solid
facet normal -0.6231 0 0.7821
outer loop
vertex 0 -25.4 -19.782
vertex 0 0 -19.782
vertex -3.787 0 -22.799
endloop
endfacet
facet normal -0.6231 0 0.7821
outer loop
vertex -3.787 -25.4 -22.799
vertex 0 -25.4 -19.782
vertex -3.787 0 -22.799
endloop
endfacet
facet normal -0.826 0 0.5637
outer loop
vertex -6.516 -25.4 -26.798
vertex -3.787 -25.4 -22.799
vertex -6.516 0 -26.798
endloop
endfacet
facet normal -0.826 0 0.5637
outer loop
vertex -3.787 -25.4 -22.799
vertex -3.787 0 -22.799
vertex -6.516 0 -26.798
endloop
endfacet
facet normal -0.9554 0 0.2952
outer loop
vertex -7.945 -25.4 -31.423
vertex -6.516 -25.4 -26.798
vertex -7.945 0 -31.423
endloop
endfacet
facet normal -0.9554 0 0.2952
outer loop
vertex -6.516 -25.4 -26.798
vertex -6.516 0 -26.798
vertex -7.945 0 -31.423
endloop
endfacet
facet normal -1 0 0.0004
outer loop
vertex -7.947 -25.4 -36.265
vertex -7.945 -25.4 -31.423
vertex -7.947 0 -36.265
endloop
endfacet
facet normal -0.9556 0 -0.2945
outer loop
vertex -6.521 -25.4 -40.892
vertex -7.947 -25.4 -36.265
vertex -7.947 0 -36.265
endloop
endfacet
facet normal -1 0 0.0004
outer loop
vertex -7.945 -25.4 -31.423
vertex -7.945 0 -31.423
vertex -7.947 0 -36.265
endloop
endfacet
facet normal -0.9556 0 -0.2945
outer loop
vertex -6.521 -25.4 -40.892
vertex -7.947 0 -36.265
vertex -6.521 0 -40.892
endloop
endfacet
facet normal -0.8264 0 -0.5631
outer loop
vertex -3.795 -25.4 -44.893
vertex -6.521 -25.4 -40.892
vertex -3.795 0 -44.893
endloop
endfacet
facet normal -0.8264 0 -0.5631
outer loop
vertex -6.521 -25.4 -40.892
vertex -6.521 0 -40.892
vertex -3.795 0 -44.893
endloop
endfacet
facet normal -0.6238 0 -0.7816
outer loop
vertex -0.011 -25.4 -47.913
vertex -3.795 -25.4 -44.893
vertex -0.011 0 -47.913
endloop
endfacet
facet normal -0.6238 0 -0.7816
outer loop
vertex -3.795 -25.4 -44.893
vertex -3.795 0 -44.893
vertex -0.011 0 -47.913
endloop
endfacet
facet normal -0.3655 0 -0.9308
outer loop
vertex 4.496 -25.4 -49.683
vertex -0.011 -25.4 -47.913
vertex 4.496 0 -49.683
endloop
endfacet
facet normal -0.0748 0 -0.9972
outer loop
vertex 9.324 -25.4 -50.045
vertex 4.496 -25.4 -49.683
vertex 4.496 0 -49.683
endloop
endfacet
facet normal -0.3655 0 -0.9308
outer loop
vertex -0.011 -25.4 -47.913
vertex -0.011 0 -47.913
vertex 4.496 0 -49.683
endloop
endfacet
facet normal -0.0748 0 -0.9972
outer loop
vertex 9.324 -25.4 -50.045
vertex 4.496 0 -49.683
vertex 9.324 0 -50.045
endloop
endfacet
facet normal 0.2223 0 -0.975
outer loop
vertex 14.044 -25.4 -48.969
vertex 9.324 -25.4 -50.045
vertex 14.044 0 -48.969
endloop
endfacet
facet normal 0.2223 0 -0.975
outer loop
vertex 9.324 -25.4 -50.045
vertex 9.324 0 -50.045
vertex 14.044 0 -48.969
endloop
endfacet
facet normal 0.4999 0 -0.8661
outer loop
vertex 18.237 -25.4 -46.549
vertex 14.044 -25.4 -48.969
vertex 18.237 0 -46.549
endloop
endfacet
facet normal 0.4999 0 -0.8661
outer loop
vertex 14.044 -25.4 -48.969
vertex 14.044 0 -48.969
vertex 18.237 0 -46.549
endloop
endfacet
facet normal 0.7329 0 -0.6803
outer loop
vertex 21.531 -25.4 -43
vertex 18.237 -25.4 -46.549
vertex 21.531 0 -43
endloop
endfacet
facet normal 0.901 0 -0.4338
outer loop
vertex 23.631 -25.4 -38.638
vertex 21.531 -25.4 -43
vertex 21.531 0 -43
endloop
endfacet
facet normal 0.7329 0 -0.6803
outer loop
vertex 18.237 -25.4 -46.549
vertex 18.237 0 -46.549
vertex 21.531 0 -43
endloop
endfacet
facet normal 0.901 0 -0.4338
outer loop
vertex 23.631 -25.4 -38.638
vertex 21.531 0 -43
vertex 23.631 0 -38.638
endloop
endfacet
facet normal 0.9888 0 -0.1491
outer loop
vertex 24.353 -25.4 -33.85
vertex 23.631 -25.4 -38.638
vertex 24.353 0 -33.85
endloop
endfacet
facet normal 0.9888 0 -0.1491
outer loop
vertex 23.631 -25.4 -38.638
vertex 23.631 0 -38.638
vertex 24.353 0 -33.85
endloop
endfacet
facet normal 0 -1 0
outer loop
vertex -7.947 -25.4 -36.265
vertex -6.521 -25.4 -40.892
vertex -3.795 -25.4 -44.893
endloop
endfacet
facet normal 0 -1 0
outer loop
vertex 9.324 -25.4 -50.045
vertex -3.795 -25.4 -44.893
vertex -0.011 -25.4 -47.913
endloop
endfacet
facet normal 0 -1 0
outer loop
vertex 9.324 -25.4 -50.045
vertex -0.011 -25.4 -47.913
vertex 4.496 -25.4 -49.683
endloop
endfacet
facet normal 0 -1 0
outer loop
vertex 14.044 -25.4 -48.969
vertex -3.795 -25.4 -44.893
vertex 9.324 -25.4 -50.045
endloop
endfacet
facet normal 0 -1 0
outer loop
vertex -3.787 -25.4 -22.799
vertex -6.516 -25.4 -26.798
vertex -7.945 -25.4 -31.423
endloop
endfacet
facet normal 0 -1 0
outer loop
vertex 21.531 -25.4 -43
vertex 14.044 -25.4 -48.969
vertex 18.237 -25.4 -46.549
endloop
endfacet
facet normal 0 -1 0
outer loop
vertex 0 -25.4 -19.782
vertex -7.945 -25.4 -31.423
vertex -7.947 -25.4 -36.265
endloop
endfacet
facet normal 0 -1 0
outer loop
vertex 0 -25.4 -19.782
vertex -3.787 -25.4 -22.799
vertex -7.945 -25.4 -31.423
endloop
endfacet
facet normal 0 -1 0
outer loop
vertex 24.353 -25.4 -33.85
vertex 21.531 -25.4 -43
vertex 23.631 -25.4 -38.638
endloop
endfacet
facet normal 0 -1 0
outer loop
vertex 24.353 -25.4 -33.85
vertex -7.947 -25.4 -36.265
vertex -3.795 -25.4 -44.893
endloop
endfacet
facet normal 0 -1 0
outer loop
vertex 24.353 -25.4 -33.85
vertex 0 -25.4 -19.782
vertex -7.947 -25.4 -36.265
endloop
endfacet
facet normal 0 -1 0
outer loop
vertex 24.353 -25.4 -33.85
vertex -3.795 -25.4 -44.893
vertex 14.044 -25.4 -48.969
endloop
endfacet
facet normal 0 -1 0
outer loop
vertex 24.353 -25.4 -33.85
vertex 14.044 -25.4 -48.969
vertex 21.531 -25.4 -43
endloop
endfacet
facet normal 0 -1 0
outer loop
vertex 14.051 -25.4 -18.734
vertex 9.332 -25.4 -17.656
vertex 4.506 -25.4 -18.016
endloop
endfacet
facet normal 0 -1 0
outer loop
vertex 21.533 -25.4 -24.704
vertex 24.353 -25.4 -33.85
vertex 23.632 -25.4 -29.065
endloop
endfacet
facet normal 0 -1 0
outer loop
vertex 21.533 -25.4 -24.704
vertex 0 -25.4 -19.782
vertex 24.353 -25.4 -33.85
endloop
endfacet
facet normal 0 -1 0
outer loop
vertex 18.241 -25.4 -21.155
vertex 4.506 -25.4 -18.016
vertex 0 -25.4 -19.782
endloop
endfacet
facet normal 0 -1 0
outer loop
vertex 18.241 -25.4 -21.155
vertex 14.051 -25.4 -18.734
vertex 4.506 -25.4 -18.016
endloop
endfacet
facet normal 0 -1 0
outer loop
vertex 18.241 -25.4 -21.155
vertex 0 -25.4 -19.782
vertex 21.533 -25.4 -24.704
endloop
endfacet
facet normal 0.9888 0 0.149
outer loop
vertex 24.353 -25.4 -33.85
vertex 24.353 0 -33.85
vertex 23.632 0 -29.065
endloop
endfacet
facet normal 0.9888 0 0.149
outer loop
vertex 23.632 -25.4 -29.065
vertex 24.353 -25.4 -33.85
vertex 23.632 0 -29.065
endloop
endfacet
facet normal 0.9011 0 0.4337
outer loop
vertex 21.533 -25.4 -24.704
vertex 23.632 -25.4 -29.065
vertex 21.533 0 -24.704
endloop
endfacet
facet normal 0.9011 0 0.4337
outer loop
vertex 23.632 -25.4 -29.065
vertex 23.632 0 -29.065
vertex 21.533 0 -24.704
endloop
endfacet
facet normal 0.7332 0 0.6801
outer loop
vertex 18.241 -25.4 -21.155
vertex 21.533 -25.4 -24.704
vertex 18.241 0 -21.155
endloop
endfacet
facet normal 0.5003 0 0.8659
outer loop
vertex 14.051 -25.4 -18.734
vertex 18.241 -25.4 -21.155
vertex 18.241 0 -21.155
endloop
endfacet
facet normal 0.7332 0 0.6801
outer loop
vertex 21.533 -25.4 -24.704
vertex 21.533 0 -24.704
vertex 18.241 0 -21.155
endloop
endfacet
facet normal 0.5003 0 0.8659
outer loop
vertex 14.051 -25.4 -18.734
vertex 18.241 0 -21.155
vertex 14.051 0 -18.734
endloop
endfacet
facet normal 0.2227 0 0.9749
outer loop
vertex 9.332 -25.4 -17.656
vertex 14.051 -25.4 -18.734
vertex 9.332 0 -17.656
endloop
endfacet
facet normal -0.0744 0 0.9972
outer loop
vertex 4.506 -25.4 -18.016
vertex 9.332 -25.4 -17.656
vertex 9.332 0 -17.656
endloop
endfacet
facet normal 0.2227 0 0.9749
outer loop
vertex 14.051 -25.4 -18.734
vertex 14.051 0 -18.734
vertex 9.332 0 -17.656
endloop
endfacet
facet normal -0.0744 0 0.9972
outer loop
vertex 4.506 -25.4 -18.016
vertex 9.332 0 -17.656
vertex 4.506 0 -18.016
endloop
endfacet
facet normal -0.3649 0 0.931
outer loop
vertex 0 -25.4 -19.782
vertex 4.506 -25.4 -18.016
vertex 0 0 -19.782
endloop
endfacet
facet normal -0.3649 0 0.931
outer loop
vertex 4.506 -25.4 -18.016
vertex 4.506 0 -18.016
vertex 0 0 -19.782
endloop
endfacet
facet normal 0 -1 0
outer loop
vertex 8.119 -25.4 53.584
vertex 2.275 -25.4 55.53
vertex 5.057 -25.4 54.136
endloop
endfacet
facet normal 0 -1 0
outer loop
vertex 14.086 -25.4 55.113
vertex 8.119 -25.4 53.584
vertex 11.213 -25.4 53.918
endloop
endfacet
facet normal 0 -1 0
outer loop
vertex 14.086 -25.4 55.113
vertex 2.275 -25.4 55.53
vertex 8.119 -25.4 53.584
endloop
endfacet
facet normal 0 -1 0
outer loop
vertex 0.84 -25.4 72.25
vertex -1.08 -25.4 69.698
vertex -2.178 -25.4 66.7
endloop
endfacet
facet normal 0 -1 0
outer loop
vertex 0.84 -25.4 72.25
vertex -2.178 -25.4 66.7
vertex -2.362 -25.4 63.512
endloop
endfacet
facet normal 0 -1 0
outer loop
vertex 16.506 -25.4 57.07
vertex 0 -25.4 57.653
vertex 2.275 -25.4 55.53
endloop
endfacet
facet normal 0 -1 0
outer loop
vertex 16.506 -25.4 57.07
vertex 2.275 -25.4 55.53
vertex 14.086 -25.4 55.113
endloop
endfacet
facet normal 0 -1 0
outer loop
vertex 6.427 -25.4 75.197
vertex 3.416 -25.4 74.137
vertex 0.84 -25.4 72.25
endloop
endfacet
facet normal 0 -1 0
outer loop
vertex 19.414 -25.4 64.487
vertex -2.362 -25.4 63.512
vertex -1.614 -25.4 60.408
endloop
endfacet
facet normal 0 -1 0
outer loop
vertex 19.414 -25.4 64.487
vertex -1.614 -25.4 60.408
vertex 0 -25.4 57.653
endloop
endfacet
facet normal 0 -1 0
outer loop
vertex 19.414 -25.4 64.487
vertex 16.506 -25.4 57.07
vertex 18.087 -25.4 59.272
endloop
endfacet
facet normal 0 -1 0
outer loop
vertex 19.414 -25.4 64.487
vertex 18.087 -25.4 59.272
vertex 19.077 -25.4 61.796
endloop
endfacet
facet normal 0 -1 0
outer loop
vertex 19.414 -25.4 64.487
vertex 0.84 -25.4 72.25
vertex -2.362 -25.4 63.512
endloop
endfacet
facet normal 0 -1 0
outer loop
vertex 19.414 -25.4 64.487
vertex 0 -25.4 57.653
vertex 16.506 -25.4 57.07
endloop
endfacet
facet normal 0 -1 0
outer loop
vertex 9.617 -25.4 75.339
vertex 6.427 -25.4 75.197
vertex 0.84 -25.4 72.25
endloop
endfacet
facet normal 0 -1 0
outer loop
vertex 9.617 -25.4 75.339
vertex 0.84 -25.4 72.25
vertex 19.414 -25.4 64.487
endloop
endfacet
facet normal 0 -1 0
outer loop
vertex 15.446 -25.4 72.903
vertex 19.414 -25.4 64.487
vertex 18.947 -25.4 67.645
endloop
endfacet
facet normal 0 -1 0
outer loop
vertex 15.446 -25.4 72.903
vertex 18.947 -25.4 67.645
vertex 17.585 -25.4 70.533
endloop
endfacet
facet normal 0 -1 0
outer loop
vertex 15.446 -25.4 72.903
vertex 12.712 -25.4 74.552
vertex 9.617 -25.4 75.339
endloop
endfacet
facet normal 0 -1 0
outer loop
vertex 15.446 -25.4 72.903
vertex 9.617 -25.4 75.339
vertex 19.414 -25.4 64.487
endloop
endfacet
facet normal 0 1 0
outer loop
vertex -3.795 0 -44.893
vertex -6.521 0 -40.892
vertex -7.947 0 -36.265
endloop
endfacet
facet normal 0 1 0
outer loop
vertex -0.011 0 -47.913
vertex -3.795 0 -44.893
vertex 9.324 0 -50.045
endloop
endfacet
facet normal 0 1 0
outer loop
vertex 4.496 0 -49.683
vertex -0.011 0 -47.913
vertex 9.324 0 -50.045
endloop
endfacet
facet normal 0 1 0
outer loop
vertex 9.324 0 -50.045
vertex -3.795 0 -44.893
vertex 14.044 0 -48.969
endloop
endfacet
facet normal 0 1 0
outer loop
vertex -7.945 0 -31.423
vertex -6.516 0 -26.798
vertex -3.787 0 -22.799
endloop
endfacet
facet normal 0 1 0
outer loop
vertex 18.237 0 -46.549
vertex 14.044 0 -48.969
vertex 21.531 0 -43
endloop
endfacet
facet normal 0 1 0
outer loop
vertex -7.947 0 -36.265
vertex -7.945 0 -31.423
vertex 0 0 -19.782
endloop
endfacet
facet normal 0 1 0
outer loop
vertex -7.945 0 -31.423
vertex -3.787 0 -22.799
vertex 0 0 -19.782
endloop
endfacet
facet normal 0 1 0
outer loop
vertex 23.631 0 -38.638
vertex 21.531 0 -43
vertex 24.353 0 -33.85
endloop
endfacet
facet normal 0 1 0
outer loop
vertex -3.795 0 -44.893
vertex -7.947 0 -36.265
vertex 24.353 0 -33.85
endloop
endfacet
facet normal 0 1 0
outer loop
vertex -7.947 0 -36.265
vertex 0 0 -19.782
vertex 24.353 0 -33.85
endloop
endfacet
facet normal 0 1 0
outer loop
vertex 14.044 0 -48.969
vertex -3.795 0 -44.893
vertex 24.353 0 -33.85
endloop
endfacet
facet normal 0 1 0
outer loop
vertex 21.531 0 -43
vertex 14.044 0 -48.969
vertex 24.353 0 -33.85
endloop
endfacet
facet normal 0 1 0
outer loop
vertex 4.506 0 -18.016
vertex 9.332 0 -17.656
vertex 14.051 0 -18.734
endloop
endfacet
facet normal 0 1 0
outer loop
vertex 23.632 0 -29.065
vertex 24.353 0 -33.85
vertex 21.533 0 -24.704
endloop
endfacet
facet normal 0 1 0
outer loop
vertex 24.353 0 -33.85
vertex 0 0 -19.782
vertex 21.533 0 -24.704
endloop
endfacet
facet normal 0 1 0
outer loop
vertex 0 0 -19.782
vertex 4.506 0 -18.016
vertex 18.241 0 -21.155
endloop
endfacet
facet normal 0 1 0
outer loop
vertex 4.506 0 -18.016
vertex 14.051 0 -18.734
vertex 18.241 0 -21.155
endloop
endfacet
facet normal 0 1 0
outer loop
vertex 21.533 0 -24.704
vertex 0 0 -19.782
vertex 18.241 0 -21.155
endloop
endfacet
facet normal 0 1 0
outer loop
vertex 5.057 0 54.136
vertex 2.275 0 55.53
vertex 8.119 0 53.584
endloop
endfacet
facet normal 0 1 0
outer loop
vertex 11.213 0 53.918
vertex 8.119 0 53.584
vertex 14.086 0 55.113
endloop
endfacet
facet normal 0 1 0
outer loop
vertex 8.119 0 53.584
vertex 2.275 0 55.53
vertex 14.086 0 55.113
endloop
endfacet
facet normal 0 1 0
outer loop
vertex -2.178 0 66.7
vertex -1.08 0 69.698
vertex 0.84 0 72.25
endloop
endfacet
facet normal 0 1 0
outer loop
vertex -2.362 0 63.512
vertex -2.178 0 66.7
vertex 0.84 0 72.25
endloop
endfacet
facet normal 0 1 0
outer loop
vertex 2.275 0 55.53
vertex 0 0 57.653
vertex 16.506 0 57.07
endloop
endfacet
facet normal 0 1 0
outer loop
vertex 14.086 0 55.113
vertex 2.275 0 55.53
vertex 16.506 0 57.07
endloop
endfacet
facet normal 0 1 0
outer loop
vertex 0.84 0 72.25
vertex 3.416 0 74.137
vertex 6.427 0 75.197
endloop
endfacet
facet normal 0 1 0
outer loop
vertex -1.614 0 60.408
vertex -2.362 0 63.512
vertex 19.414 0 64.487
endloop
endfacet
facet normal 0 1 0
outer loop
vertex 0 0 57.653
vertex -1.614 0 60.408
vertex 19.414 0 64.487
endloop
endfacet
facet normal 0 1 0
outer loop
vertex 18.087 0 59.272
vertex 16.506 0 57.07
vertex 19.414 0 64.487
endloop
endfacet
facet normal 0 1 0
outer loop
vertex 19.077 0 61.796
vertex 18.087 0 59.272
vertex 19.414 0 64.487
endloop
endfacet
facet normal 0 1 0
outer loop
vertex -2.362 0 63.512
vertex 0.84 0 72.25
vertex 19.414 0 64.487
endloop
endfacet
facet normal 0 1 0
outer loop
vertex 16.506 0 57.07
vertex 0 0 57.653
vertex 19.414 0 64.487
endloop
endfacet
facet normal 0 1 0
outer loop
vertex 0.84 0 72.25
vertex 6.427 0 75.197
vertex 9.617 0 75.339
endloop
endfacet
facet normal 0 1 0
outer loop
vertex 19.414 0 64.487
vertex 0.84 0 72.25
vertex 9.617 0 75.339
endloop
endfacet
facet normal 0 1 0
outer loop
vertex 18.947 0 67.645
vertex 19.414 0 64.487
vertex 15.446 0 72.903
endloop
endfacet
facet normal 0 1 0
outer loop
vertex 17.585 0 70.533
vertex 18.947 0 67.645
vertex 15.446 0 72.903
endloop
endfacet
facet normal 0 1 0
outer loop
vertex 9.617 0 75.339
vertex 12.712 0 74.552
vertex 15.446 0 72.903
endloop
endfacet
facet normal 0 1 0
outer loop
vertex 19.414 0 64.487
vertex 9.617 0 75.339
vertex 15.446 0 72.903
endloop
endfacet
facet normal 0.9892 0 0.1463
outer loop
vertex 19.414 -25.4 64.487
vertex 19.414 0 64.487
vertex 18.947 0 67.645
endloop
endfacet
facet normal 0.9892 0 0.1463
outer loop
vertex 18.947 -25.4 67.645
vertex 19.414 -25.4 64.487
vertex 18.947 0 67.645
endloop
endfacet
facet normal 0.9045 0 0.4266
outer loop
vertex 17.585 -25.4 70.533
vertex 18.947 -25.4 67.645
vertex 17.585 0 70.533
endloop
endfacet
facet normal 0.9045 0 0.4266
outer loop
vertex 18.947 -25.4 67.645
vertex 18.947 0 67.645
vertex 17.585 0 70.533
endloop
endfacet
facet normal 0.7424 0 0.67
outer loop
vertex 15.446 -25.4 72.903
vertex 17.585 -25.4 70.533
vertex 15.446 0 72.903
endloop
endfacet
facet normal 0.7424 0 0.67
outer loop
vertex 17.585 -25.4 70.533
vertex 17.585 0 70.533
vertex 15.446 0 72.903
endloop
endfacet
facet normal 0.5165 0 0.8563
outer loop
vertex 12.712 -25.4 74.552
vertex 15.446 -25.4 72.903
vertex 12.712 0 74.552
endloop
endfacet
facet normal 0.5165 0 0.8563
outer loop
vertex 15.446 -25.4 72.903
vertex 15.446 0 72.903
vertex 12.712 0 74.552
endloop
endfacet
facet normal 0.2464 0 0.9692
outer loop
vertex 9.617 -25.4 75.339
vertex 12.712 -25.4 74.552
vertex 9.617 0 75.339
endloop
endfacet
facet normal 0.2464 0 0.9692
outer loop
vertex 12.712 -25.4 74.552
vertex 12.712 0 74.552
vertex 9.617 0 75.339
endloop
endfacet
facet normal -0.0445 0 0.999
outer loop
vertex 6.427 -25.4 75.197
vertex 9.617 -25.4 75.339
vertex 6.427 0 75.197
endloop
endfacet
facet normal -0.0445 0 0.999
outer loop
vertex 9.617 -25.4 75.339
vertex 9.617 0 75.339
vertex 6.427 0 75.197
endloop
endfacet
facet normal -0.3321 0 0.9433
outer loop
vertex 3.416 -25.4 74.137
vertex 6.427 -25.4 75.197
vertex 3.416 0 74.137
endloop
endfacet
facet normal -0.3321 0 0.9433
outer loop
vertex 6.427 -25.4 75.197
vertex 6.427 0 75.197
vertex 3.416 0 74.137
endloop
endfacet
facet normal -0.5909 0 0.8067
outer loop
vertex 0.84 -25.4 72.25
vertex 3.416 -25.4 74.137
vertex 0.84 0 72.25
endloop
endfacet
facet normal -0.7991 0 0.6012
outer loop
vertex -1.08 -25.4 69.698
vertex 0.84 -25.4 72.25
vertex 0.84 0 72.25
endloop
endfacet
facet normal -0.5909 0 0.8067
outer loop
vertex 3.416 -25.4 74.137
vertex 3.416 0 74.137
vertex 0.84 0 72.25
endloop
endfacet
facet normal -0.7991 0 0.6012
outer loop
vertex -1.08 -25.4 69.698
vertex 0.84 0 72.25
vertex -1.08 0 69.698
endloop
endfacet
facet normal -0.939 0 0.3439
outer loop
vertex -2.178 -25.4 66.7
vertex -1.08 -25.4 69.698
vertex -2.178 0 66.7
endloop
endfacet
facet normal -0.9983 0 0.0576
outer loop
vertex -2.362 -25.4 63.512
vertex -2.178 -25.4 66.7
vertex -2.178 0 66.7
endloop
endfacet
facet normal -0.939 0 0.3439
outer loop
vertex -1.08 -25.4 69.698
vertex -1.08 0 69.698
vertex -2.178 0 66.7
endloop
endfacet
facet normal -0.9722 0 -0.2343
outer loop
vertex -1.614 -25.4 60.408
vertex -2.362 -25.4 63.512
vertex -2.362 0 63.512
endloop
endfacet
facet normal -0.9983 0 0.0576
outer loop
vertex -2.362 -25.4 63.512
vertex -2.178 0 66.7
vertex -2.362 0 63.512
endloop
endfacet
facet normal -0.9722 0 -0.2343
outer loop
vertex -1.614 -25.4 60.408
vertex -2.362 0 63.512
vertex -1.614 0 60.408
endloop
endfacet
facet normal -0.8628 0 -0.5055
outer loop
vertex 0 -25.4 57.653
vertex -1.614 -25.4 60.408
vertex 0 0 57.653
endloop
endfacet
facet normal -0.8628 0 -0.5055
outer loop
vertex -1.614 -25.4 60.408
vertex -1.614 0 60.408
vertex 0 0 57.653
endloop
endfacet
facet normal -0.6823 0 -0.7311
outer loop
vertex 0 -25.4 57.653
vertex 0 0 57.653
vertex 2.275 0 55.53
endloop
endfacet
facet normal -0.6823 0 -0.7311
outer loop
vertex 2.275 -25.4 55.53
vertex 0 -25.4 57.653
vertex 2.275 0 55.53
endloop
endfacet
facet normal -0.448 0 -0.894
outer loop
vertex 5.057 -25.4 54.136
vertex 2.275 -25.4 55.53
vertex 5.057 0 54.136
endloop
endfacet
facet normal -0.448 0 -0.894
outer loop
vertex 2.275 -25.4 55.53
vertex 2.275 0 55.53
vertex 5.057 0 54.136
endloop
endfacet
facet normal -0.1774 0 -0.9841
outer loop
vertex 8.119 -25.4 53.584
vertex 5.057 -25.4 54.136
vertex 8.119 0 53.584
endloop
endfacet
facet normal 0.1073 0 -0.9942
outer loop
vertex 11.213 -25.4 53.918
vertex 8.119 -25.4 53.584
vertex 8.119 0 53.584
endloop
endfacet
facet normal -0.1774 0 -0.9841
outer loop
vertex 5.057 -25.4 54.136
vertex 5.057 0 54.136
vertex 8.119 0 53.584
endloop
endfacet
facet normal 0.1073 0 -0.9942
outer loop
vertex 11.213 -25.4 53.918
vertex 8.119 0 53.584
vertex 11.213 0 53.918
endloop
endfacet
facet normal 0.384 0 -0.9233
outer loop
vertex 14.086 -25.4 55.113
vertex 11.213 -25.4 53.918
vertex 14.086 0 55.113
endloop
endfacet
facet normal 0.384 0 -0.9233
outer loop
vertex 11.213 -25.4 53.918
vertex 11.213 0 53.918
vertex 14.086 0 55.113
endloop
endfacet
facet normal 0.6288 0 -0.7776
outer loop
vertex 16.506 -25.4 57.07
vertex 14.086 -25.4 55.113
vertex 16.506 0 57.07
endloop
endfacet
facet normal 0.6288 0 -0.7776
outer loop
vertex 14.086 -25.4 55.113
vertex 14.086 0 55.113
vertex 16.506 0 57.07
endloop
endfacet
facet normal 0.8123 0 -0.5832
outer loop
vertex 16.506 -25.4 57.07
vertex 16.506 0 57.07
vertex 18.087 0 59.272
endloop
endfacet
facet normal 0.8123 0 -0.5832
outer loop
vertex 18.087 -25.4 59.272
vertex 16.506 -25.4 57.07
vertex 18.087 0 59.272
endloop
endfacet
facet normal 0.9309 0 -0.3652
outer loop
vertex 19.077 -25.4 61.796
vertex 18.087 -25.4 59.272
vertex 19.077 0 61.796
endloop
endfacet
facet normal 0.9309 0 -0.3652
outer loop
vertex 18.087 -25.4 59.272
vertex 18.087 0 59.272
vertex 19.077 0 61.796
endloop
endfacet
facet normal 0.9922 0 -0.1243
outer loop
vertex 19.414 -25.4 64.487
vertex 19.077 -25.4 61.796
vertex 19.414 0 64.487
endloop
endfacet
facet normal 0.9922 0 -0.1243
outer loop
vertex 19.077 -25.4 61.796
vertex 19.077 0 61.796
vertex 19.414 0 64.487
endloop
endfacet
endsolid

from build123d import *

# Parameters (mm, degrees)
F1_DEPTH = 25.4


with BuildPart() as f1:
    # F0 (on Front) → F1 (new body)
    with BuildSketch(Plane.XZ):
        with BuildLine():
            ThreePointArc((24.353171, -33.850387), (16.236652, -19.787989), (0, -19.781727))
            ThreePointArc((0, -19.781727), (-0.010849, -47.912785), (24.353171, -33.850387))
        make_face()
        with BuildLine():
            ThreePointArc((19.414169, 64.486521), (4.882439, 74.777335), (0, 57.653265))
            ThreePointArc((0, 57.653265), (8.119291, 53.583681), (16.50556, 57.070069))
            ThreePointArc((16.50556, 57.070069), (18.66102, 60.503314), (19.414169, 64.486521))
        make_face()
    extrude(amount=F1_DEPTH)


solid = f1.part
